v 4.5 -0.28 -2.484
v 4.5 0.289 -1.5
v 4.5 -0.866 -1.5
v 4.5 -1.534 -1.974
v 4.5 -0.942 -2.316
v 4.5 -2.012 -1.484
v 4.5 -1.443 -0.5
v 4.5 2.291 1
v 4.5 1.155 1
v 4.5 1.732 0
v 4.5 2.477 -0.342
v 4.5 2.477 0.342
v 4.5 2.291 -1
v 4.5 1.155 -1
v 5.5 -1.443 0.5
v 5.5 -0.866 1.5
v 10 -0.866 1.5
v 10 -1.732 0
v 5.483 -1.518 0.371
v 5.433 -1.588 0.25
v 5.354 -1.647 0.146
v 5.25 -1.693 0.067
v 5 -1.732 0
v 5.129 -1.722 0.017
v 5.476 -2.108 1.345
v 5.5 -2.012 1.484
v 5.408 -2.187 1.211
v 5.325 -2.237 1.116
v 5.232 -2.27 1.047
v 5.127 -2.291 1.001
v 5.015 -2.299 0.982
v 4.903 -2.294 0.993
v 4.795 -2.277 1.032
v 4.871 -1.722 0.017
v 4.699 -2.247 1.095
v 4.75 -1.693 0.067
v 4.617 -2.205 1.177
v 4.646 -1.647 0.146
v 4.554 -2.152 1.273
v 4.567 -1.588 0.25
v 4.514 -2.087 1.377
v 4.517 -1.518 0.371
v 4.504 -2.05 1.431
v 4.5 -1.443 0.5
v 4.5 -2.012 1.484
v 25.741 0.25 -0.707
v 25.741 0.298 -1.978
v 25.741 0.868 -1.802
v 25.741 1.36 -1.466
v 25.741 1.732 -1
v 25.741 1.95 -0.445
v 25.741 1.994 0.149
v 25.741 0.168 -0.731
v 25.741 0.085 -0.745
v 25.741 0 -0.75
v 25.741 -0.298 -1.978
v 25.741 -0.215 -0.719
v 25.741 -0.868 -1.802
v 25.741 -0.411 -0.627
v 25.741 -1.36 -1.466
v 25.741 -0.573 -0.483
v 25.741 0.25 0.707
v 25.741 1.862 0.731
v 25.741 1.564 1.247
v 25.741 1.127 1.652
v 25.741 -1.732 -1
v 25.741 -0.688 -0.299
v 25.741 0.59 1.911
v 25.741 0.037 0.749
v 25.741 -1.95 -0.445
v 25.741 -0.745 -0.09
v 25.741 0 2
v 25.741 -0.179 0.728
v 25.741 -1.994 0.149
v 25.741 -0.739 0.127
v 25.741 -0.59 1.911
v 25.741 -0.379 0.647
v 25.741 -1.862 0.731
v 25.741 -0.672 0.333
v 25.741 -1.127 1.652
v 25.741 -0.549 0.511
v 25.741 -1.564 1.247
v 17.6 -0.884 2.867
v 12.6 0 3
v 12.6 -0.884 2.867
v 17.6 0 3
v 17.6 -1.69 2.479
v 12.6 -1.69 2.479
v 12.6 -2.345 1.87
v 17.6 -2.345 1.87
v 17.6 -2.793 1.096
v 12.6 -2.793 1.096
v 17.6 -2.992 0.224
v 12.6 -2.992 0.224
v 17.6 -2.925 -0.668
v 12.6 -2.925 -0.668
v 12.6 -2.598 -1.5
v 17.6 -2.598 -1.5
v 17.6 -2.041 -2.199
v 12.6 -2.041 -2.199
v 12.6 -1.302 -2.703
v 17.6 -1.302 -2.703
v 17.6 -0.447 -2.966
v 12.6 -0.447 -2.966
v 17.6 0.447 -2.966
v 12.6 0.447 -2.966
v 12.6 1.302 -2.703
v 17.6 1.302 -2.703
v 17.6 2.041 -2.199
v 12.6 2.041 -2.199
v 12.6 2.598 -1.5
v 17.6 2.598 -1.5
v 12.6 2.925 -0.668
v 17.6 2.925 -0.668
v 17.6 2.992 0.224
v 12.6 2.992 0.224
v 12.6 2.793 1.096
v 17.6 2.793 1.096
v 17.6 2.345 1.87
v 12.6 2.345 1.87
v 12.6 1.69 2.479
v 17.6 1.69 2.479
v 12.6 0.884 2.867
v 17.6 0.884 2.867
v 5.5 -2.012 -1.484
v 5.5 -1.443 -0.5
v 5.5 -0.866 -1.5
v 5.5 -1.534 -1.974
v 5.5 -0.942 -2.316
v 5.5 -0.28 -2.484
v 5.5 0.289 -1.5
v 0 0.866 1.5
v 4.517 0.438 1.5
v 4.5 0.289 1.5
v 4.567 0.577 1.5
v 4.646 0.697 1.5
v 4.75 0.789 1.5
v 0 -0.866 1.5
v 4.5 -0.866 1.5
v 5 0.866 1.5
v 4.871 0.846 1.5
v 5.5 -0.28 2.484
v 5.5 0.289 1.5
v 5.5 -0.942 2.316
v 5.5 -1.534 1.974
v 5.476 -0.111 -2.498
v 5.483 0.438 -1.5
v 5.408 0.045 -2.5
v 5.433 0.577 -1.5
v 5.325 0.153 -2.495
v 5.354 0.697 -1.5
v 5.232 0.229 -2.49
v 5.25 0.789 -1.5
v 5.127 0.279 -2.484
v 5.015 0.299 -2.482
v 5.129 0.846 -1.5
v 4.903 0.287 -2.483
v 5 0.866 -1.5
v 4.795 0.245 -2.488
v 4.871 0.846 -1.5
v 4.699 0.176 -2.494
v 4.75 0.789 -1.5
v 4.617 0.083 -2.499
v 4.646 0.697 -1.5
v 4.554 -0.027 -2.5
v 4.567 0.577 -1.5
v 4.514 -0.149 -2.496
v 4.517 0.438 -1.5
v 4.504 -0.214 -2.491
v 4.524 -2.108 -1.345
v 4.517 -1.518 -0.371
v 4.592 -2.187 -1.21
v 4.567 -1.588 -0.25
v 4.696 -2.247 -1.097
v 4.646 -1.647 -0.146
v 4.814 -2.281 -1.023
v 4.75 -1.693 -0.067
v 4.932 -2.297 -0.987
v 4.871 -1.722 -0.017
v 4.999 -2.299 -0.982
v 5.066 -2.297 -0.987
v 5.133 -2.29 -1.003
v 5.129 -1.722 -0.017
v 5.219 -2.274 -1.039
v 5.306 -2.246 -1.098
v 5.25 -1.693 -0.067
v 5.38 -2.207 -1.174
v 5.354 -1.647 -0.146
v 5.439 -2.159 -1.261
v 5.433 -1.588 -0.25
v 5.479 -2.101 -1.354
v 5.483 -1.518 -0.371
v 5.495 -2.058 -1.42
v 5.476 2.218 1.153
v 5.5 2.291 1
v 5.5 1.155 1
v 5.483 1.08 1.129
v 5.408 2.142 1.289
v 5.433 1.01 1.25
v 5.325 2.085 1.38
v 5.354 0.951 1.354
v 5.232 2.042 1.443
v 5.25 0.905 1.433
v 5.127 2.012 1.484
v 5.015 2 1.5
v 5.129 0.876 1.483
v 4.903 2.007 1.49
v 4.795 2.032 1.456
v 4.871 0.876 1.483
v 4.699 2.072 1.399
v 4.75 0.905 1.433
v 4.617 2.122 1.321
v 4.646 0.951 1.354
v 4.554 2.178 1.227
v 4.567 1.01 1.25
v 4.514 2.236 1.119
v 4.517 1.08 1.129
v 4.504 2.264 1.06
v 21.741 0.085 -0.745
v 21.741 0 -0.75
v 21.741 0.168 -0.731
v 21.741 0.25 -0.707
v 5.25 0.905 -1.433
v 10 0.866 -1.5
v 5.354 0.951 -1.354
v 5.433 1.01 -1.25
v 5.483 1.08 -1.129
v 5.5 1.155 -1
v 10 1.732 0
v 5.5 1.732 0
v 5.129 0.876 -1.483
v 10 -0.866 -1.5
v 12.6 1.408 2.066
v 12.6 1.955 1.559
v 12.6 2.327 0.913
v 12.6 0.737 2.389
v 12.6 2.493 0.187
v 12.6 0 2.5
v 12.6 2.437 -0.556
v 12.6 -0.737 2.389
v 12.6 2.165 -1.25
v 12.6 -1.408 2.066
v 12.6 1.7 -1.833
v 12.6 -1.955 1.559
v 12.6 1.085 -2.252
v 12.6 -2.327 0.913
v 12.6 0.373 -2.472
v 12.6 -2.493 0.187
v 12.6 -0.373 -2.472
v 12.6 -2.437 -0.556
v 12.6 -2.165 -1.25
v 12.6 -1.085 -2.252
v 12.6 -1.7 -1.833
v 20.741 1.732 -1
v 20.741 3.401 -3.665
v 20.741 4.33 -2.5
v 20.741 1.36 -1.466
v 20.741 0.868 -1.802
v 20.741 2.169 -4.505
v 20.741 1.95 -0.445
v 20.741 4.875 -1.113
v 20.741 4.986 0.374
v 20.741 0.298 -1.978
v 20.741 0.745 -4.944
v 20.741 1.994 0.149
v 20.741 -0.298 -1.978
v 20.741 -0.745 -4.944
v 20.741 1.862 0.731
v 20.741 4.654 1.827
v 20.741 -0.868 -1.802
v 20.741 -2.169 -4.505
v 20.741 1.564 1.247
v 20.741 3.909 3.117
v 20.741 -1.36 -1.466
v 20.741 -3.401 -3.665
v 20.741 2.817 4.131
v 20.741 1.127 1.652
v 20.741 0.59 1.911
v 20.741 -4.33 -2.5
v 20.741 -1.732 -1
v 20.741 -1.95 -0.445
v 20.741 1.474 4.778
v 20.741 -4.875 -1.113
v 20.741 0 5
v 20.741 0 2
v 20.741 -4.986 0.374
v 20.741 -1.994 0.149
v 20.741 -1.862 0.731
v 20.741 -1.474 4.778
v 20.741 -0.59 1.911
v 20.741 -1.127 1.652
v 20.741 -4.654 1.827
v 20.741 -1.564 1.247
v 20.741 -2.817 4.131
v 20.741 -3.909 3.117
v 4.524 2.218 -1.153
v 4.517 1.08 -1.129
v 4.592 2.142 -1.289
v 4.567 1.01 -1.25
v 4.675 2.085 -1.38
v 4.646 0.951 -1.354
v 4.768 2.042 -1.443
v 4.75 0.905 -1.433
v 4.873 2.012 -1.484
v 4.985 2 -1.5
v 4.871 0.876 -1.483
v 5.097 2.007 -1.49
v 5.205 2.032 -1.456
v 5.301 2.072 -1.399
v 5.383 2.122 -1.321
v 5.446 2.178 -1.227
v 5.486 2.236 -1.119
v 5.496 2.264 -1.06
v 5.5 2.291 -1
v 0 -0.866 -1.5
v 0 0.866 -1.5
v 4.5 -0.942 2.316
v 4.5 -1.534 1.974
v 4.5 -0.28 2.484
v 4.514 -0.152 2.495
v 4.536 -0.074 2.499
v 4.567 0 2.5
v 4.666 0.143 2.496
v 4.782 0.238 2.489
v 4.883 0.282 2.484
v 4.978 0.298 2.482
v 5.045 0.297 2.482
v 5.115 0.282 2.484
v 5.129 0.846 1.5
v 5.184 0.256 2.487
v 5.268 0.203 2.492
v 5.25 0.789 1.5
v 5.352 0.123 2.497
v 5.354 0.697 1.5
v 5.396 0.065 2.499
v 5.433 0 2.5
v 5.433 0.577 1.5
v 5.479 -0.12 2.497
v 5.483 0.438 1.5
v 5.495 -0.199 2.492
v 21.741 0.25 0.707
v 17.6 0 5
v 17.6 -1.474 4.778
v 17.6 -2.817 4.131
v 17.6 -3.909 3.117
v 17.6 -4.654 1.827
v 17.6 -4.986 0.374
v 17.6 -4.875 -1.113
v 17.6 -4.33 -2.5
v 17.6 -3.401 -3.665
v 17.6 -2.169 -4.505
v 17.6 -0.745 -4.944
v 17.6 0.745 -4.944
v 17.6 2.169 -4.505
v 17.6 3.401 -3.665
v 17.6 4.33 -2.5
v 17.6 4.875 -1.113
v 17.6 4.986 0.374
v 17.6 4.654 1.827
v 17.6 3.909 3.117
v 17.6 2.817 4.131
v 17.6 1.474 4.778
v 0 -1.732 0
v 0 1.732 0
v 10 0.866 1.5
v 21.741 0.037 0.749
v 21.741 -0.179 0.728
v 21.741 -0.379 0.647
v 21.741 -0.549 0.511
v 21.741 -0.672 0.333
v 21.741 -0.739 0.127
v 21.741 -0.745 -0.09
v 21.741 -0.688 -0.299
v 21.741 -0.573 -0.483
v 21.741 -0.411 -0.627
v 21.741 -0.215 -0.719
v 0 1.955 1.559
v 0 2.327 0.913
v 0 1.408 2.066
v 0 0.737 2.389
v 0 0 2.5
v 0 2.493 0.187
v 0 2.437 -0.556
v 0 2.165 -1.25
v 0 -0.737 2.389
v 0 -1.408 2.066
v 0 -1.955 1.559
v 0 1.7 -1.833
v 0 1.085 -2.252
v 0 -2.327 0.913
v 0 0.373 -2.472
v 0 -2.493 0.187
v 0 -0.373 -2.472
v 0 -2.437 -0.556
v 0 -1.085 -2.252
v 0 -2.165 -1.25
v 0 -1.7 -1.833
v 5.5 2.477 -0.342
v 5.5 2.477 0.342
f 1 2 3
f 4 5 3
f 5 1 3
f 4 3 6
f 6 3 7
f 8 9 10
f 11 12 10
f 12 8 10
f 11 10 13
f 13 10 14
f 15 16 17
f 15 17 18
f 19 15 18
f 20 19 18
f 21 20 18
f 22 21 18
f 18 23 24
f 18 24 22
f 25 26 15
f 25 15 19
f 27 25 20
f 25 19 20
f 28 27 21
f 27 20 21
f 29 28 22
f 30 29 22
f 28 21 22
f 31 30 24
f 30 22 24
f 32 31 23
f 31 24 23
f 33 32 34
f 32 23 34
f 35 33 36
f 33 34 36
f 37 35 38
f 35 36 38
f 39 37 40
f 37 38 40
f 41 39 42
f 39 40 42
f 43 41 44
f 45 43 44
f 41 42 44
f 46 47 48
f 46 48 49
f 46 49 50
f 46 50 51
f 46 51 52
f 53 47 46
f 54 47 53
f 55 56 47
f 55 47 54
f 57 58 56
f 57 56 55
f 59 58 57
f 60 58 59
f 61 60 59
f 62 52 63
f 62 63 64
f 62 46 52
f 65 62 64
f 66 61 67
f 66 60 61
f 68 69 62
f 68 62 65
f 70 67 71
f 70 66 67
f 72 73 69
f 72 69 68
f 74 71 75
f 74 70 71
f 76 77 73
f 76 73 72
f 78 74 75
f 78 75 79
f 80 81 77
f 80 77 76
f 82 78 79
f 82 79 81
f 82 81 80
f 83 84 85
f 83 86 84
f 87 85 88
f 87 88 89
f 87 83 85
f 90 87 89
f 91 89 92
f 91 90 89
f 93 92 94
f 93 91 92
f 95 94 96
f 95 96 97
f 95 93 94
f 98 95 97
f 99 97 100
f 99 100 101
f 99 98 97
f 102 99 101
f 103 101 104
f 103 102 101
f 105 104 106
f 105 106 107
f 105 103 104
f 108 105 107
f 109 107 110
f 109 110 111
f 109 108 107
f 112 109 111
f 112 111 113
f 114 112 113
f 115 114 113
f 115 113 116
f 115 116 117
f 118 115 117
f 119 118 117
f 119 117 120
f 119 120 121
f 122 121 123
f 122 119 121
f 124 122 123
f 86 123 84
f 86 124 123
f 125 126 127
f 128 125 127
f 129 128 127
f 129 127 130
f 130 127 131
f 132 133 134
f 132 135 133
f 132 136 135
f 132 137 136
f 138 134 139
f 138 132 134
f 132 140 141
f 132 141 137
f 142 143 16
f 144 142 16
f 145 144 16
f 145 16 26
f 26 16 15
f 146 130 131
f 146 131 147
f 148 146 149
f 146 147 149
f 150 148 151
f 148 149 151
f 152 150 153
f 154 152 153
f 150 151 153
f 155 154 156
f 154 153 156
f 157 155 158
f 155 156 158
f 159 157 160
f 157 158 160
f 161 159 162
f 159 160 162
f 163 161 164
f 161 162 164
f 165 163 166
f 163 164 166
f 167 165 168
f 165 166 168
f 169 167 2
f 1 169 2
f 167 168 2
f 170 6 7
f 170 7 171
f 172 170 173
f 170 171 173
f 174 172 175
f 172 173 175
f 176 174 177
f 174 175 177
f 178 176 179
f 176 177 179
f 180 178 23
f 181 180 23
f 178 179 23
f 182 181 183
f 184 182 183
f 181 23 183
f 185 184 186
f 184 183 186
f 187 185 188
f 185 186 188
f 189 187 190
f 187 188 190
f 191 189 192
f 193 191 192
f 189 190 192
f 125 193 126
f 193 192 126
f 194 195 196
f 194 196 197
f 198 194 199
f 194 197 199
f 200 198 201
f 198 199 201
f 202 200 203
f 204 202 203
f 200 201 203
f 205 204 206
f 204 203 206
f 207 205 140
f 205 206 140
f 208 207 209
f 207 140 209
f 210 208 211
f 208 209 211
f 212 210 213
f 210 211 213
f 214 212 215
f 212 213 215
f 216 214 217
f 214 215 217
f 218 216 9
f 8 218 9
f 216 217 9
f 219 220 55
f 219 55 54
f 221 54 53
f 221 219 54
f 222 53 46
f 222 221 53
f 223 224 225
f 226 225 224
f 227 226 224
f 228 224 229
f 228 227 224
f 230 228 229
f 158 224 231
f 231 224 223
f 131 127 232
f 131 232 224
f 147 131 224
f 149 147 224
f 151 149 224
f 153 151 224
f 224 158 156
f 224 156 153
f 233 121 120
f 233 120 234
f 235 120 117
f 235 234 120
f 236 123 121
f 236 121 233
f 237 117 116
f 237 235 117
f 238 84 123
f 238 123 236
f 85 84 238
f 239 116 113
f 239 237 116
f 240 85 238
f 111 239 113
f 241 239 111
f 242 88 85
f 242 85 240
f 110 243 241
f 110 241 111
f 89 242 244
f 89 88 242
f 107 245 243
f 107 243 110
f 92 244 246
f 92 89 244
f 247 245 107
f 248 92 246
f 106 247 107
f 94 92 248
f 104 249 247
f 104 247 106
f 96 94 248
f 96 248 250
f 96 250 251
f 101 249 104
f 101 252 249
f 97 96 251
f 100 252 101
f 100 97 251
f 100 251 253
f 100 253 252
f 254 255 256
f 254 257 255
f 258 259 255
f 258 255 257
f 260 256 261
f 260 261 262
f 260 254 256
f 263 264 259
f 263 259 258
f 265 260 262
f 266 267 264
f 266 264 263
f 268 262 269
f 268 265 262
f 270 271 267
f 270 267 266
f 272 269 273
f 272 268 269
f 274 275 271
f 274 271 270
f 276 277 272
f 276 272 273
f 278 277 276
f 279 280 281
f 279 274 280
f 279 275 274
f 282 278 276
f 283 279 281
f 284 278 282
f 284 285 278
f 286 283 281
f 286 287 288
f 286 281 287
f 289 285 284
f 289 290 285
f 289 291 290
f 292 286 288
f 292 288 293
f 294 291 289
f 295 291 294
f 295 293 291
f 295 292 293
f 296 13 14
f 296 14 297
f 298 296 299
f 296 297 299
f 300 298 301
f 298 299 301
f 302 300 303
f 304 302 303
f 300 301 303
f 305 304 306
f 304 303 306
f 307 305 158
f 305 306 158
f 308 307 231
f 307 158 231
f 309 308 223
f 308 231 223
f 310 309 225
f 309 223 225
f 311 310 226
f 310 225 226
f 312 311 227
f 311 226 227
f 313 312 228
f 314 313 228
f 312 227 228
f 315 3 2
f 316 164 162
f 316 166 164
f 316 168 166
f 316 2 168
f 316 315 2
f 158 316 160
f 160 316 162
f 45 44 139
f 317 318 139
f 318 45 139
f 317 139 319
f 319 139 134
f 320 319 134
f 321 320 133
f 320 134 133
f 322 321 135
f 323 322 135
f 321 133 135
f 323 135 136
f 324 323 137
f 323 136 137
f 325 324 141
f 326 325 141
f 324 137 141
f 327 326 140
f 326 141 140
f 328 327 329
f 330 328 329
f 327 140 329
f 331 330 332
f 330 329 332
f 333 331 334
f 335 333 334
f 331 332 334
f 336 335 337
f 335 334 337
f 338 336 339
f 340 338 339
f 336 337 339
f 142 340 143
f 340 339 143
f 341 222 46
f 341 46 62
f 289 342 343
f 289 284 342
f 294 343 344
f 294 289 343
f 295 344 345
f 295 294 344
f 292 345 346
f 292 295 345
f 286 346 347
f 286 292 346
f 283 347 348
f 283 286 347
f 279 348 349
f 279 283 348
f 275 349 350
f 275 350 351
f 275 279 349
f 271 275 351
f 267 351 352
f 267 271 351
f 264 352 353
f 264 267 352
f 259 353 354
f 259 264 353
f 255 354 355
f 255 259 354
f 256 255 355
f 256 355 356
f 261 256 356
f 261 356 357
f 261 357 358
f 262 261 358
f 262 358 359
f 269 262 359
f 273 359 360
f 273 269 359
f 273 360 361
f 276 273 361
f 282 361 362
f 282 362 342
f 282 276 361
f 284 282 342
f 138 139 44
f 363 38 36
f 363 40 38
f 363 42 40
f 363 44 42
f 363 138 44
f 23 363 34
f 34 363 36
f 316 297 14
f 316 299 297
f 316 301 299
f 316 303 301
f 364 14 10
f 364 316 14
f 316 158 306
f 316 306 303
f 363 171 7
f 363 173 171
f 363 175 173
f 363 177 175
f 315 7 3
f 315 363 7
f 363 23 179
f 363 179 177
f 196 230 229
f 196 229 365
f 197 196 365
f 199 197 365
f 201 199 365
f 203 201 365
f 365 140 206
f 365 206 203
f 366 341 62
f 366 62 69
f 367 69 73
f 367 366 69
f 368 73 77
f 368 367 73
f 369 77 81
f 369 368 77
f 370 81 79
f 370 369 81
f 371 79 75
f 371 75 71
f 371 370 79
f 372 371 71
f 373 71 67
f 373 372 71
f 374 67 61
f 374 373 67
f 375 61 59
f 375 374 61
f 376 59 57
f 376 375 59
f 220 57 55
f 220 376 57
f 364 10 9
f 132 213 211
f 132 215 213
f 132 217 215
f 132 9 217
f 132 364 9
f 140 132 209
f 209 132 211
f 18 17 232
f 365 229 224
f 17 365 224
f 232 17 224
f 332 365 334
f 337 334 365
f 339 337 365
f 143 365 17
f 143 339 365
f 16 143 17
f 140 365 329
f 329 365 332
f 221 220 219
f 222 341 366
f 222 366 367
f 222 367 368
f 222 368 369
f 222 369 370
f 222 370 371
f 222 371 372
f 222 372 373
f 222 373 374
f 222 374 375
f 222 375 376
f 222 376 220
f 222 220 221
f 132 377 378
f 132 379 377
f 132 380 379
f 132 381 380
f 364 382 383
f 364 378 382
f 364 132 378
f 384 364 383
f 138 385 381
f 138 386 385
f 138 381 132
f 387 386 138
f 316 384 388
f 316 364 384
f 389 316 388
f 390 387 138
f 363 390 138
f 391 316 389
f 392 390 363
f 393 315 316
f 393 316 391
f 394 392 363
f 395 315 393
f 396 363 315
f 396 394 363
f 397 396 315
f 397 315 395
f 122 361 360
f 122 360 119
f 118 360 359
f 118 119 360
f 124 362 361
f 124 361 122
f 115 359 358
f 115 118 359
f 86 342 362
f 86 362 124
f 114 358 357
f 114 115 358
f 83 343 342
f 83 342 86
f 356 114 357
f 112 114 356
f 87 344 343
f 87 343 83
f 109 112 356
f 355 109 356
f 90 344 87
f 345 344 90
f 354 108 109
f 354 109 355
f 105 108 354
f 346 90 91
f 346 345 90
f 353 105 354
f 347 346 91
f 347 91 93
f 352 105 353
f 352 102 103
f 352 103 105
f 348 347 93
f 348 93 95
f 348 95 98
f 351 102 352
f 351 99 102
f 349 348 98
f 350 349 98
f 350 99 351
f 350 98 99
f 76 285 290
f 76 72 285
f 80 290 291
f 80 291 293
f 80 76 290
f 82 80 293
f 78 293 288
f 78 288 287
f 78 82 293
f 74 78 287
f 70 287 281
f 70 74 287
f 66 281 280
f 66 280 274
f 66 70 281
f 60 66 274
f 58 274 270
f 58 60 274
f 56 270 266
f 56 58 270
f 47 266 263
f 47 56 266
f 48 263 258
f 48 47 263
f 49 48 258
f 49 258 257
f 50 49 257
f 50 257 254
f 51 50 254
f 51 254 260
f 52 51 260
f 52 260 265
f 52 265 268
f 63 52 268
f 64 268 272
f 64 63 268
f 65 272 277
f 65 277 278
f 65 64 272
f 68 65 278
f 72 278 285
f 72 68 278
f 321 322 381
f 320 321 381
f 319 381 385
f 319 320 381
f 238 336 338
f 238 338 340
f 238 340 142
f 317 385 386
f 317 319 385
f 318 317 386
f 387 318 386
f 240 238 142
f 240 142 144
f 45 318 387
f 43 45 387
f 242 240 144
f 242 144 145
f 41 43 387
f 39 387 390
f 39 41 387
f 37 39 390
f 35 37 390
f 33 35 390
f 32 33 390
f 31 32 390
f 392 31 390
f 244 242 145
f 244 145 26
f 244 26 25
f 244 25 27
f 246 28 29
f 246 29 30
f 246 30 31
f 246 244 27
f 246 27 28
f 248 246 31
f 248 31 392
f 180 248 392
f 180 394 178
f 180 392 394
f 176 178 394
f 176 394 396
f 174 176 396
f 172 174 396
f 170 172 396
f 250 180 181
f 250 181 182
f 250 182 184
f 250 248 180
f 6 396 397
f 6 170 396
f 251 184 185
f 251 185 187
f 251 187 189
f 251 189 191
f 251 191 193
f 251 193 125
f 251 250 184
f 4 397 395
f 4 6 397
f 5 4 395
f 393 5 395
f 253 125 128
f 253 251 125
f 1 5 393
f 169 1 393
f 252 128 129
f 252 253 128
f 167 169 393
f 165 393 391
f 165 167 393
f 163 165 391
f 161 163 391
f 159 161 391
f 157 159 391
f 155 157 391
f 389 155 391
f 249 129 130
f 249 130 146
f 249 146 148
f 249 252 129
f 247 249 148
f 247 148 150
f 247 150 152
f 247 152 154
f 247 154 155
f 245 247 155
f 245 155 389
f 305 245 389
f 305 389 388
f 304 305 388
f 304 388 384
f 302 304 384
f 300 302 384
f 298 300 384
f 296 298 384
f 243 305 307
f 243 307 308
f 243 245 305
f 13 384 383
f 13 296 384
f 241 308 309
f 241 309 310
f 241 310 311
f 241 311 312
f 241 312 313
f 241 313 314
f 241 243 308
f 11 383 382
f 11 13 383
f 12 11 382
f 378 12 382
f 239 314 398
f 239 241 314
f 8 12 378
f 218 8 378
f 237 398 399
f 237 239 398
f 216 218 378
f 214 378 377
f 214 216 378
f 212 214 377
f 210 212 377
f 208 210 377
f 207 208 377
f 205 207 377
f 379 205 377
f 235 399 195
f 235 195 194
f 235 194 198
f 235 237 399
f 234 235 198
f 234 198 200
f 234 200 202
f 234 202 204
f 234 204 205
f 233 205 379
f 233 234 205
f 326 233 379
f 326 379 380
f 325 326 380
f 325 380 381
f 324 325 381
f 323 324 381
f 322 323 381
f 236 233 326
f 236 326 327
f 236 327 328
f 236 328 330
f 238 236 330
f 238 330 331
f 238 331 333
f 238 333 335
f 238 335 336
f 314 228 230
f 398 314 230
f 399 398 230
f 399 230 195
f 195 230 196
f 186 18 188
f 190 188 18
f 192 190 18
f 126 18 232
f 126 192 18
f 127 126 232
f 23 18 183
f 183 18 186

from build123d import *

# Parameters (mm, degrees)
CUT_EXTRUDE1_DEPTH = 10
CUT_EXTRUDE2_DEPTH = 18
CIRPATTERN1_COUNT  = 3
CUT_EXTRUDE3_START = 21.741254
CUT_EXTRUDE3_DEPTH = 4


with BuildPart() as part:
    # Sketch1 → Revolve1 (revolve)
    with BuildSketch(Plane.XY, mode=Mode.PRIVATE) as revolve1_sk:
        Polygon((0, 2.5), (12.6, 2.5), (12.6, 3), (17.6, 3), (17.6, 5), (20.741253759, 5), (20.741253759, 2), (25.741253759, 2), (25.741253759, 0), (0, 0), align=None)
    revolve(revolve1_sk.sketch.rotate(Axis((0, 0, 0), (1, 0, 0)), 90), axis=Axis((0, 0, 0), (1, 0, 0)))

    # Sketch2 → Cut-Extrude1 (cut)
    with BuildSketch(Plane(origin=(0, 0, 0), x_dir=(0, 0, -1), z_dir=(1, 0, 0))):
        Polygon((0, 1.732050808), (-1.5, 0.866025404), (-1.5, -0.866025404), (0, -1.732050808), (1.5, -0.866025404), (1.5, 0.866025404), align=None)
    extrude(amount=CUT_EXTRUDE1_DEPTH, mode=Mode.SUBTRACT)

    # Sketch3 → Cut-Extrude2 (cut)
    with BuildSketch(Plane(origin=(0, 0, 0), x_dir=(1, 0, 0), z_dir=(0, 1, 0))):
        with BuildLine():
            Line((5.5, 1), (5.5, -1))
            ThreePointArc((5.5, -1), (5, -1.5), (4.5, -1))
            Line((4.5, -1), (4.5, 1))
            ThreePointArc((4.5, 1), (5, 1.5), (5.5, 1))
        make_face()
    cut_extrude2 = extrude(amount=CUT_EXTRUDE2_DEPTH, mode=Mode.SUBTRACT)

    # CirPattern1: Cut-Extrude2 ×3 about axis
    cirpattern1_axis = Axis((0, 0, 0), (-1, 0, 0))
    for i in range(1, CIRPATTERN1_COUNT):
        add(cut_extrude2.rotate(cirpattern1_axis, i * 360 / CIRPATTERN1_COUNT), mode=Mode.SUBTRACT)

    # Sketch4 → Cut-Extrude3 (cut)
    with BuildSketch(Plane(origin=(0, 0, 0), x_dir=(0, 0, -1), z_dir=(1, 0, 0)).offset(CUT_EXTRUDE3_START)):
        with BuildLine():
            Line((0.707106781, 0.25), (-0.707106781, 0.25))
            ThreePointArc((-0.707106781, 0.25), (-0.126826484, -0.73919892), (0.75, 0))
            ThreePointArc((0.75, 0), (0.73919892, 0.126826484), (0.707106781, 0.25))
        make_face()
    extrude(amount=CUT_EXTRUDE3_DEPTH, mode=Mode.SUBTRACT)


solid = part.part
